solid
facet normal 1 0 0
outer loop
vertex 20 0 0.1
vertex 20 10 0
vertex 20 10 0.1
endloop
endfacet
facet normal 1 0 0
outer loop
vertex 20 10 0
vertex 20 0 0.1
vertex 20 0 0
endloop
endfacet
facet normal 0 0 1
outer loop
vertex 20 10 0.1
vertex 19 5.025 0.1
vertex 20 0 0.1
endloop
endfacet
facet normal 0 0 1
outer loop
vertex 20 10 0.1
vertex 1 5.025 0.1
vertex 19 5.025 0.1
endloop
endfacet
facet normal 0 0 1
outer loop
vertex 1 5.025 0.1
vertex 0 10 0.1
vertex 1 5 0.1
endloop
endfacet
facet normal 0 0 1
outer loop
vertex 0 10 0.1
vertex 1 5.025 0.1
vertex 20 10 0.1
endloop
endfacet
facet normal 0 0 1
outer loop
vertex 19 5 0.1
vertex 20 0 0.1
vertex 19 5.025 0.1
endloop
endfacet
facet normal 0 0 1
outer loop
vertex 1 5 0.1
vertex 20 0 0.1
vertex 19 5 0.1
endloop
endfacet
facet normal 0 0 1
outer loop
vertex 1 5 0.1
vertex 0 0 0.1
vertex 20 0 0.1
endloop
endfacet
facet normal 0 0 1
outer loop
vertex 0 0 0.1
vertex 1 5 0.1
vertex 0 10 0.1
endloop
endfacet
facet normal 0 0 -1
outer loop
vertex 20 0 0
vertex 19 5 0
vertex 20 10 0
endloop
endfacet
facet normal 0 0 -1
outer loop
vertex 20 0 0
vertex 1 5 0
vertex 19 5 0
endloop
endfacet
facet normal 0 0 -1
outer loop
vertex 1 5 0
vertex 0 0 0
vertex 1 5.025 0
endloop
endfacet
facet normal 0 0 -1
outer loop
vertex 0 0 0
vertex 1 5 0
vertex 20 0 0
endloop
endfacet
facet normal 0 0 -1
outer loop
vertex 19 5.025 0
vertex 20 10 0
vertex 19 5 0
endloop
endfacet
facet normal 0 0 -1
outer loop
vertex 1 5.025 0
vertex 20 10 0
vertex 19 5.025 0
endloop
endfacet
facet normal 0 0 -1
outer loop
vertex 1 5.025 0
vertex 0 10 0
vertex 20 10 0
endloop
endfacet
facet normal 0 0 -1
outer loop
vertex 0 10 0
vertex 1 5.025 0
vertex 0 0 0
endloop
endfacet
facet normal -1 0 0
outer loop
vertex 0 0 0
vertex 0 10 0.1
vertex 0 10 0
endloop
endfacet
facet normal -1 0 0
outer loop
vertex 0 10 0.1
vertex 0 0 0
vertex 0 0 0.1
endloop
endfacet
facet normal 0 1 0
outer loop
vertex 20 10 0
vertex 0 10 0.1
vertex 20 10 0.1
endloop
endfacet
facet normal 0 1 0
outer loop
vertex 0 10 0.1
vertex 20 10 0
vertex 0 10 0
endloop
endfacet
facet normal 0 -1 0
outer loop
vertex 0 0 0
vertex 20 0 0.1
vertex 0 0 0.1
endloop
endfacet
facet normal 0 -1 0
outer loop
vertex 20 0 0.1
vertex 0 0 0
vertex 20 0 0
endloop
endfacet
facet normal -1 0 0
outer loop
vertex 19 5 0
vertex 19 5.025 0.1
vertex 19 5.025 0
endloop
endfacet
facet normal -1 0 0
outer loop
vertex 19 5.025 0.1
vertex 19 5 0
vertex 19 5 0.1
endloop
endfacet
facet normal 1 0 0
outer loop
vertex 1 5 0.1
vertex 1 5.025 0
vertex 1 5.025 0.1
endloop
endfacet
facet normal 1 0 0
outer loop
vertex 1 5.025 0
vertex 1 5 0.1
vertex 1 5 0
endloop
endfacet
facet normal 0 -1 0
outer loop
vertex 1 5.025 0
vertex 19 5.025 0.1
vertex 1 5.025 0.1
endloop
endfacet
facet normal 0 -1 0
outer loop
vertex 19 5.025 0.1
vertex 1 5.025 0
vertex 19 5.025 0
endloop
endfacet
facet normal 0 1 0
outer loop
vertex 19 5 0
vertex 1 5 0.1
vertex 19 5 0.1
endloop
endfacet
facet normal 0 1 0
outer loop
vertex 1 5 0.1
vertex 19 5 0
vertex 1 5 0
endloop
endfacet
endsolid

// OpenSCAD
//design by Sean Murphy

//This code generates a simple collimating slit of customisable size.

/* [Global] */


//width of plate
width=20;

//height of plate
height=10;

//thickness of plate
depth=0.1;

//slit height
slit_height=0.025;

//set openSCAD resolution
$fa=1;
$fs=1;

difference() {
cube([width,height,depth], 0);
translate([1,height/2, 0])
cube([width-2,slit_height,depth], 0);
}
